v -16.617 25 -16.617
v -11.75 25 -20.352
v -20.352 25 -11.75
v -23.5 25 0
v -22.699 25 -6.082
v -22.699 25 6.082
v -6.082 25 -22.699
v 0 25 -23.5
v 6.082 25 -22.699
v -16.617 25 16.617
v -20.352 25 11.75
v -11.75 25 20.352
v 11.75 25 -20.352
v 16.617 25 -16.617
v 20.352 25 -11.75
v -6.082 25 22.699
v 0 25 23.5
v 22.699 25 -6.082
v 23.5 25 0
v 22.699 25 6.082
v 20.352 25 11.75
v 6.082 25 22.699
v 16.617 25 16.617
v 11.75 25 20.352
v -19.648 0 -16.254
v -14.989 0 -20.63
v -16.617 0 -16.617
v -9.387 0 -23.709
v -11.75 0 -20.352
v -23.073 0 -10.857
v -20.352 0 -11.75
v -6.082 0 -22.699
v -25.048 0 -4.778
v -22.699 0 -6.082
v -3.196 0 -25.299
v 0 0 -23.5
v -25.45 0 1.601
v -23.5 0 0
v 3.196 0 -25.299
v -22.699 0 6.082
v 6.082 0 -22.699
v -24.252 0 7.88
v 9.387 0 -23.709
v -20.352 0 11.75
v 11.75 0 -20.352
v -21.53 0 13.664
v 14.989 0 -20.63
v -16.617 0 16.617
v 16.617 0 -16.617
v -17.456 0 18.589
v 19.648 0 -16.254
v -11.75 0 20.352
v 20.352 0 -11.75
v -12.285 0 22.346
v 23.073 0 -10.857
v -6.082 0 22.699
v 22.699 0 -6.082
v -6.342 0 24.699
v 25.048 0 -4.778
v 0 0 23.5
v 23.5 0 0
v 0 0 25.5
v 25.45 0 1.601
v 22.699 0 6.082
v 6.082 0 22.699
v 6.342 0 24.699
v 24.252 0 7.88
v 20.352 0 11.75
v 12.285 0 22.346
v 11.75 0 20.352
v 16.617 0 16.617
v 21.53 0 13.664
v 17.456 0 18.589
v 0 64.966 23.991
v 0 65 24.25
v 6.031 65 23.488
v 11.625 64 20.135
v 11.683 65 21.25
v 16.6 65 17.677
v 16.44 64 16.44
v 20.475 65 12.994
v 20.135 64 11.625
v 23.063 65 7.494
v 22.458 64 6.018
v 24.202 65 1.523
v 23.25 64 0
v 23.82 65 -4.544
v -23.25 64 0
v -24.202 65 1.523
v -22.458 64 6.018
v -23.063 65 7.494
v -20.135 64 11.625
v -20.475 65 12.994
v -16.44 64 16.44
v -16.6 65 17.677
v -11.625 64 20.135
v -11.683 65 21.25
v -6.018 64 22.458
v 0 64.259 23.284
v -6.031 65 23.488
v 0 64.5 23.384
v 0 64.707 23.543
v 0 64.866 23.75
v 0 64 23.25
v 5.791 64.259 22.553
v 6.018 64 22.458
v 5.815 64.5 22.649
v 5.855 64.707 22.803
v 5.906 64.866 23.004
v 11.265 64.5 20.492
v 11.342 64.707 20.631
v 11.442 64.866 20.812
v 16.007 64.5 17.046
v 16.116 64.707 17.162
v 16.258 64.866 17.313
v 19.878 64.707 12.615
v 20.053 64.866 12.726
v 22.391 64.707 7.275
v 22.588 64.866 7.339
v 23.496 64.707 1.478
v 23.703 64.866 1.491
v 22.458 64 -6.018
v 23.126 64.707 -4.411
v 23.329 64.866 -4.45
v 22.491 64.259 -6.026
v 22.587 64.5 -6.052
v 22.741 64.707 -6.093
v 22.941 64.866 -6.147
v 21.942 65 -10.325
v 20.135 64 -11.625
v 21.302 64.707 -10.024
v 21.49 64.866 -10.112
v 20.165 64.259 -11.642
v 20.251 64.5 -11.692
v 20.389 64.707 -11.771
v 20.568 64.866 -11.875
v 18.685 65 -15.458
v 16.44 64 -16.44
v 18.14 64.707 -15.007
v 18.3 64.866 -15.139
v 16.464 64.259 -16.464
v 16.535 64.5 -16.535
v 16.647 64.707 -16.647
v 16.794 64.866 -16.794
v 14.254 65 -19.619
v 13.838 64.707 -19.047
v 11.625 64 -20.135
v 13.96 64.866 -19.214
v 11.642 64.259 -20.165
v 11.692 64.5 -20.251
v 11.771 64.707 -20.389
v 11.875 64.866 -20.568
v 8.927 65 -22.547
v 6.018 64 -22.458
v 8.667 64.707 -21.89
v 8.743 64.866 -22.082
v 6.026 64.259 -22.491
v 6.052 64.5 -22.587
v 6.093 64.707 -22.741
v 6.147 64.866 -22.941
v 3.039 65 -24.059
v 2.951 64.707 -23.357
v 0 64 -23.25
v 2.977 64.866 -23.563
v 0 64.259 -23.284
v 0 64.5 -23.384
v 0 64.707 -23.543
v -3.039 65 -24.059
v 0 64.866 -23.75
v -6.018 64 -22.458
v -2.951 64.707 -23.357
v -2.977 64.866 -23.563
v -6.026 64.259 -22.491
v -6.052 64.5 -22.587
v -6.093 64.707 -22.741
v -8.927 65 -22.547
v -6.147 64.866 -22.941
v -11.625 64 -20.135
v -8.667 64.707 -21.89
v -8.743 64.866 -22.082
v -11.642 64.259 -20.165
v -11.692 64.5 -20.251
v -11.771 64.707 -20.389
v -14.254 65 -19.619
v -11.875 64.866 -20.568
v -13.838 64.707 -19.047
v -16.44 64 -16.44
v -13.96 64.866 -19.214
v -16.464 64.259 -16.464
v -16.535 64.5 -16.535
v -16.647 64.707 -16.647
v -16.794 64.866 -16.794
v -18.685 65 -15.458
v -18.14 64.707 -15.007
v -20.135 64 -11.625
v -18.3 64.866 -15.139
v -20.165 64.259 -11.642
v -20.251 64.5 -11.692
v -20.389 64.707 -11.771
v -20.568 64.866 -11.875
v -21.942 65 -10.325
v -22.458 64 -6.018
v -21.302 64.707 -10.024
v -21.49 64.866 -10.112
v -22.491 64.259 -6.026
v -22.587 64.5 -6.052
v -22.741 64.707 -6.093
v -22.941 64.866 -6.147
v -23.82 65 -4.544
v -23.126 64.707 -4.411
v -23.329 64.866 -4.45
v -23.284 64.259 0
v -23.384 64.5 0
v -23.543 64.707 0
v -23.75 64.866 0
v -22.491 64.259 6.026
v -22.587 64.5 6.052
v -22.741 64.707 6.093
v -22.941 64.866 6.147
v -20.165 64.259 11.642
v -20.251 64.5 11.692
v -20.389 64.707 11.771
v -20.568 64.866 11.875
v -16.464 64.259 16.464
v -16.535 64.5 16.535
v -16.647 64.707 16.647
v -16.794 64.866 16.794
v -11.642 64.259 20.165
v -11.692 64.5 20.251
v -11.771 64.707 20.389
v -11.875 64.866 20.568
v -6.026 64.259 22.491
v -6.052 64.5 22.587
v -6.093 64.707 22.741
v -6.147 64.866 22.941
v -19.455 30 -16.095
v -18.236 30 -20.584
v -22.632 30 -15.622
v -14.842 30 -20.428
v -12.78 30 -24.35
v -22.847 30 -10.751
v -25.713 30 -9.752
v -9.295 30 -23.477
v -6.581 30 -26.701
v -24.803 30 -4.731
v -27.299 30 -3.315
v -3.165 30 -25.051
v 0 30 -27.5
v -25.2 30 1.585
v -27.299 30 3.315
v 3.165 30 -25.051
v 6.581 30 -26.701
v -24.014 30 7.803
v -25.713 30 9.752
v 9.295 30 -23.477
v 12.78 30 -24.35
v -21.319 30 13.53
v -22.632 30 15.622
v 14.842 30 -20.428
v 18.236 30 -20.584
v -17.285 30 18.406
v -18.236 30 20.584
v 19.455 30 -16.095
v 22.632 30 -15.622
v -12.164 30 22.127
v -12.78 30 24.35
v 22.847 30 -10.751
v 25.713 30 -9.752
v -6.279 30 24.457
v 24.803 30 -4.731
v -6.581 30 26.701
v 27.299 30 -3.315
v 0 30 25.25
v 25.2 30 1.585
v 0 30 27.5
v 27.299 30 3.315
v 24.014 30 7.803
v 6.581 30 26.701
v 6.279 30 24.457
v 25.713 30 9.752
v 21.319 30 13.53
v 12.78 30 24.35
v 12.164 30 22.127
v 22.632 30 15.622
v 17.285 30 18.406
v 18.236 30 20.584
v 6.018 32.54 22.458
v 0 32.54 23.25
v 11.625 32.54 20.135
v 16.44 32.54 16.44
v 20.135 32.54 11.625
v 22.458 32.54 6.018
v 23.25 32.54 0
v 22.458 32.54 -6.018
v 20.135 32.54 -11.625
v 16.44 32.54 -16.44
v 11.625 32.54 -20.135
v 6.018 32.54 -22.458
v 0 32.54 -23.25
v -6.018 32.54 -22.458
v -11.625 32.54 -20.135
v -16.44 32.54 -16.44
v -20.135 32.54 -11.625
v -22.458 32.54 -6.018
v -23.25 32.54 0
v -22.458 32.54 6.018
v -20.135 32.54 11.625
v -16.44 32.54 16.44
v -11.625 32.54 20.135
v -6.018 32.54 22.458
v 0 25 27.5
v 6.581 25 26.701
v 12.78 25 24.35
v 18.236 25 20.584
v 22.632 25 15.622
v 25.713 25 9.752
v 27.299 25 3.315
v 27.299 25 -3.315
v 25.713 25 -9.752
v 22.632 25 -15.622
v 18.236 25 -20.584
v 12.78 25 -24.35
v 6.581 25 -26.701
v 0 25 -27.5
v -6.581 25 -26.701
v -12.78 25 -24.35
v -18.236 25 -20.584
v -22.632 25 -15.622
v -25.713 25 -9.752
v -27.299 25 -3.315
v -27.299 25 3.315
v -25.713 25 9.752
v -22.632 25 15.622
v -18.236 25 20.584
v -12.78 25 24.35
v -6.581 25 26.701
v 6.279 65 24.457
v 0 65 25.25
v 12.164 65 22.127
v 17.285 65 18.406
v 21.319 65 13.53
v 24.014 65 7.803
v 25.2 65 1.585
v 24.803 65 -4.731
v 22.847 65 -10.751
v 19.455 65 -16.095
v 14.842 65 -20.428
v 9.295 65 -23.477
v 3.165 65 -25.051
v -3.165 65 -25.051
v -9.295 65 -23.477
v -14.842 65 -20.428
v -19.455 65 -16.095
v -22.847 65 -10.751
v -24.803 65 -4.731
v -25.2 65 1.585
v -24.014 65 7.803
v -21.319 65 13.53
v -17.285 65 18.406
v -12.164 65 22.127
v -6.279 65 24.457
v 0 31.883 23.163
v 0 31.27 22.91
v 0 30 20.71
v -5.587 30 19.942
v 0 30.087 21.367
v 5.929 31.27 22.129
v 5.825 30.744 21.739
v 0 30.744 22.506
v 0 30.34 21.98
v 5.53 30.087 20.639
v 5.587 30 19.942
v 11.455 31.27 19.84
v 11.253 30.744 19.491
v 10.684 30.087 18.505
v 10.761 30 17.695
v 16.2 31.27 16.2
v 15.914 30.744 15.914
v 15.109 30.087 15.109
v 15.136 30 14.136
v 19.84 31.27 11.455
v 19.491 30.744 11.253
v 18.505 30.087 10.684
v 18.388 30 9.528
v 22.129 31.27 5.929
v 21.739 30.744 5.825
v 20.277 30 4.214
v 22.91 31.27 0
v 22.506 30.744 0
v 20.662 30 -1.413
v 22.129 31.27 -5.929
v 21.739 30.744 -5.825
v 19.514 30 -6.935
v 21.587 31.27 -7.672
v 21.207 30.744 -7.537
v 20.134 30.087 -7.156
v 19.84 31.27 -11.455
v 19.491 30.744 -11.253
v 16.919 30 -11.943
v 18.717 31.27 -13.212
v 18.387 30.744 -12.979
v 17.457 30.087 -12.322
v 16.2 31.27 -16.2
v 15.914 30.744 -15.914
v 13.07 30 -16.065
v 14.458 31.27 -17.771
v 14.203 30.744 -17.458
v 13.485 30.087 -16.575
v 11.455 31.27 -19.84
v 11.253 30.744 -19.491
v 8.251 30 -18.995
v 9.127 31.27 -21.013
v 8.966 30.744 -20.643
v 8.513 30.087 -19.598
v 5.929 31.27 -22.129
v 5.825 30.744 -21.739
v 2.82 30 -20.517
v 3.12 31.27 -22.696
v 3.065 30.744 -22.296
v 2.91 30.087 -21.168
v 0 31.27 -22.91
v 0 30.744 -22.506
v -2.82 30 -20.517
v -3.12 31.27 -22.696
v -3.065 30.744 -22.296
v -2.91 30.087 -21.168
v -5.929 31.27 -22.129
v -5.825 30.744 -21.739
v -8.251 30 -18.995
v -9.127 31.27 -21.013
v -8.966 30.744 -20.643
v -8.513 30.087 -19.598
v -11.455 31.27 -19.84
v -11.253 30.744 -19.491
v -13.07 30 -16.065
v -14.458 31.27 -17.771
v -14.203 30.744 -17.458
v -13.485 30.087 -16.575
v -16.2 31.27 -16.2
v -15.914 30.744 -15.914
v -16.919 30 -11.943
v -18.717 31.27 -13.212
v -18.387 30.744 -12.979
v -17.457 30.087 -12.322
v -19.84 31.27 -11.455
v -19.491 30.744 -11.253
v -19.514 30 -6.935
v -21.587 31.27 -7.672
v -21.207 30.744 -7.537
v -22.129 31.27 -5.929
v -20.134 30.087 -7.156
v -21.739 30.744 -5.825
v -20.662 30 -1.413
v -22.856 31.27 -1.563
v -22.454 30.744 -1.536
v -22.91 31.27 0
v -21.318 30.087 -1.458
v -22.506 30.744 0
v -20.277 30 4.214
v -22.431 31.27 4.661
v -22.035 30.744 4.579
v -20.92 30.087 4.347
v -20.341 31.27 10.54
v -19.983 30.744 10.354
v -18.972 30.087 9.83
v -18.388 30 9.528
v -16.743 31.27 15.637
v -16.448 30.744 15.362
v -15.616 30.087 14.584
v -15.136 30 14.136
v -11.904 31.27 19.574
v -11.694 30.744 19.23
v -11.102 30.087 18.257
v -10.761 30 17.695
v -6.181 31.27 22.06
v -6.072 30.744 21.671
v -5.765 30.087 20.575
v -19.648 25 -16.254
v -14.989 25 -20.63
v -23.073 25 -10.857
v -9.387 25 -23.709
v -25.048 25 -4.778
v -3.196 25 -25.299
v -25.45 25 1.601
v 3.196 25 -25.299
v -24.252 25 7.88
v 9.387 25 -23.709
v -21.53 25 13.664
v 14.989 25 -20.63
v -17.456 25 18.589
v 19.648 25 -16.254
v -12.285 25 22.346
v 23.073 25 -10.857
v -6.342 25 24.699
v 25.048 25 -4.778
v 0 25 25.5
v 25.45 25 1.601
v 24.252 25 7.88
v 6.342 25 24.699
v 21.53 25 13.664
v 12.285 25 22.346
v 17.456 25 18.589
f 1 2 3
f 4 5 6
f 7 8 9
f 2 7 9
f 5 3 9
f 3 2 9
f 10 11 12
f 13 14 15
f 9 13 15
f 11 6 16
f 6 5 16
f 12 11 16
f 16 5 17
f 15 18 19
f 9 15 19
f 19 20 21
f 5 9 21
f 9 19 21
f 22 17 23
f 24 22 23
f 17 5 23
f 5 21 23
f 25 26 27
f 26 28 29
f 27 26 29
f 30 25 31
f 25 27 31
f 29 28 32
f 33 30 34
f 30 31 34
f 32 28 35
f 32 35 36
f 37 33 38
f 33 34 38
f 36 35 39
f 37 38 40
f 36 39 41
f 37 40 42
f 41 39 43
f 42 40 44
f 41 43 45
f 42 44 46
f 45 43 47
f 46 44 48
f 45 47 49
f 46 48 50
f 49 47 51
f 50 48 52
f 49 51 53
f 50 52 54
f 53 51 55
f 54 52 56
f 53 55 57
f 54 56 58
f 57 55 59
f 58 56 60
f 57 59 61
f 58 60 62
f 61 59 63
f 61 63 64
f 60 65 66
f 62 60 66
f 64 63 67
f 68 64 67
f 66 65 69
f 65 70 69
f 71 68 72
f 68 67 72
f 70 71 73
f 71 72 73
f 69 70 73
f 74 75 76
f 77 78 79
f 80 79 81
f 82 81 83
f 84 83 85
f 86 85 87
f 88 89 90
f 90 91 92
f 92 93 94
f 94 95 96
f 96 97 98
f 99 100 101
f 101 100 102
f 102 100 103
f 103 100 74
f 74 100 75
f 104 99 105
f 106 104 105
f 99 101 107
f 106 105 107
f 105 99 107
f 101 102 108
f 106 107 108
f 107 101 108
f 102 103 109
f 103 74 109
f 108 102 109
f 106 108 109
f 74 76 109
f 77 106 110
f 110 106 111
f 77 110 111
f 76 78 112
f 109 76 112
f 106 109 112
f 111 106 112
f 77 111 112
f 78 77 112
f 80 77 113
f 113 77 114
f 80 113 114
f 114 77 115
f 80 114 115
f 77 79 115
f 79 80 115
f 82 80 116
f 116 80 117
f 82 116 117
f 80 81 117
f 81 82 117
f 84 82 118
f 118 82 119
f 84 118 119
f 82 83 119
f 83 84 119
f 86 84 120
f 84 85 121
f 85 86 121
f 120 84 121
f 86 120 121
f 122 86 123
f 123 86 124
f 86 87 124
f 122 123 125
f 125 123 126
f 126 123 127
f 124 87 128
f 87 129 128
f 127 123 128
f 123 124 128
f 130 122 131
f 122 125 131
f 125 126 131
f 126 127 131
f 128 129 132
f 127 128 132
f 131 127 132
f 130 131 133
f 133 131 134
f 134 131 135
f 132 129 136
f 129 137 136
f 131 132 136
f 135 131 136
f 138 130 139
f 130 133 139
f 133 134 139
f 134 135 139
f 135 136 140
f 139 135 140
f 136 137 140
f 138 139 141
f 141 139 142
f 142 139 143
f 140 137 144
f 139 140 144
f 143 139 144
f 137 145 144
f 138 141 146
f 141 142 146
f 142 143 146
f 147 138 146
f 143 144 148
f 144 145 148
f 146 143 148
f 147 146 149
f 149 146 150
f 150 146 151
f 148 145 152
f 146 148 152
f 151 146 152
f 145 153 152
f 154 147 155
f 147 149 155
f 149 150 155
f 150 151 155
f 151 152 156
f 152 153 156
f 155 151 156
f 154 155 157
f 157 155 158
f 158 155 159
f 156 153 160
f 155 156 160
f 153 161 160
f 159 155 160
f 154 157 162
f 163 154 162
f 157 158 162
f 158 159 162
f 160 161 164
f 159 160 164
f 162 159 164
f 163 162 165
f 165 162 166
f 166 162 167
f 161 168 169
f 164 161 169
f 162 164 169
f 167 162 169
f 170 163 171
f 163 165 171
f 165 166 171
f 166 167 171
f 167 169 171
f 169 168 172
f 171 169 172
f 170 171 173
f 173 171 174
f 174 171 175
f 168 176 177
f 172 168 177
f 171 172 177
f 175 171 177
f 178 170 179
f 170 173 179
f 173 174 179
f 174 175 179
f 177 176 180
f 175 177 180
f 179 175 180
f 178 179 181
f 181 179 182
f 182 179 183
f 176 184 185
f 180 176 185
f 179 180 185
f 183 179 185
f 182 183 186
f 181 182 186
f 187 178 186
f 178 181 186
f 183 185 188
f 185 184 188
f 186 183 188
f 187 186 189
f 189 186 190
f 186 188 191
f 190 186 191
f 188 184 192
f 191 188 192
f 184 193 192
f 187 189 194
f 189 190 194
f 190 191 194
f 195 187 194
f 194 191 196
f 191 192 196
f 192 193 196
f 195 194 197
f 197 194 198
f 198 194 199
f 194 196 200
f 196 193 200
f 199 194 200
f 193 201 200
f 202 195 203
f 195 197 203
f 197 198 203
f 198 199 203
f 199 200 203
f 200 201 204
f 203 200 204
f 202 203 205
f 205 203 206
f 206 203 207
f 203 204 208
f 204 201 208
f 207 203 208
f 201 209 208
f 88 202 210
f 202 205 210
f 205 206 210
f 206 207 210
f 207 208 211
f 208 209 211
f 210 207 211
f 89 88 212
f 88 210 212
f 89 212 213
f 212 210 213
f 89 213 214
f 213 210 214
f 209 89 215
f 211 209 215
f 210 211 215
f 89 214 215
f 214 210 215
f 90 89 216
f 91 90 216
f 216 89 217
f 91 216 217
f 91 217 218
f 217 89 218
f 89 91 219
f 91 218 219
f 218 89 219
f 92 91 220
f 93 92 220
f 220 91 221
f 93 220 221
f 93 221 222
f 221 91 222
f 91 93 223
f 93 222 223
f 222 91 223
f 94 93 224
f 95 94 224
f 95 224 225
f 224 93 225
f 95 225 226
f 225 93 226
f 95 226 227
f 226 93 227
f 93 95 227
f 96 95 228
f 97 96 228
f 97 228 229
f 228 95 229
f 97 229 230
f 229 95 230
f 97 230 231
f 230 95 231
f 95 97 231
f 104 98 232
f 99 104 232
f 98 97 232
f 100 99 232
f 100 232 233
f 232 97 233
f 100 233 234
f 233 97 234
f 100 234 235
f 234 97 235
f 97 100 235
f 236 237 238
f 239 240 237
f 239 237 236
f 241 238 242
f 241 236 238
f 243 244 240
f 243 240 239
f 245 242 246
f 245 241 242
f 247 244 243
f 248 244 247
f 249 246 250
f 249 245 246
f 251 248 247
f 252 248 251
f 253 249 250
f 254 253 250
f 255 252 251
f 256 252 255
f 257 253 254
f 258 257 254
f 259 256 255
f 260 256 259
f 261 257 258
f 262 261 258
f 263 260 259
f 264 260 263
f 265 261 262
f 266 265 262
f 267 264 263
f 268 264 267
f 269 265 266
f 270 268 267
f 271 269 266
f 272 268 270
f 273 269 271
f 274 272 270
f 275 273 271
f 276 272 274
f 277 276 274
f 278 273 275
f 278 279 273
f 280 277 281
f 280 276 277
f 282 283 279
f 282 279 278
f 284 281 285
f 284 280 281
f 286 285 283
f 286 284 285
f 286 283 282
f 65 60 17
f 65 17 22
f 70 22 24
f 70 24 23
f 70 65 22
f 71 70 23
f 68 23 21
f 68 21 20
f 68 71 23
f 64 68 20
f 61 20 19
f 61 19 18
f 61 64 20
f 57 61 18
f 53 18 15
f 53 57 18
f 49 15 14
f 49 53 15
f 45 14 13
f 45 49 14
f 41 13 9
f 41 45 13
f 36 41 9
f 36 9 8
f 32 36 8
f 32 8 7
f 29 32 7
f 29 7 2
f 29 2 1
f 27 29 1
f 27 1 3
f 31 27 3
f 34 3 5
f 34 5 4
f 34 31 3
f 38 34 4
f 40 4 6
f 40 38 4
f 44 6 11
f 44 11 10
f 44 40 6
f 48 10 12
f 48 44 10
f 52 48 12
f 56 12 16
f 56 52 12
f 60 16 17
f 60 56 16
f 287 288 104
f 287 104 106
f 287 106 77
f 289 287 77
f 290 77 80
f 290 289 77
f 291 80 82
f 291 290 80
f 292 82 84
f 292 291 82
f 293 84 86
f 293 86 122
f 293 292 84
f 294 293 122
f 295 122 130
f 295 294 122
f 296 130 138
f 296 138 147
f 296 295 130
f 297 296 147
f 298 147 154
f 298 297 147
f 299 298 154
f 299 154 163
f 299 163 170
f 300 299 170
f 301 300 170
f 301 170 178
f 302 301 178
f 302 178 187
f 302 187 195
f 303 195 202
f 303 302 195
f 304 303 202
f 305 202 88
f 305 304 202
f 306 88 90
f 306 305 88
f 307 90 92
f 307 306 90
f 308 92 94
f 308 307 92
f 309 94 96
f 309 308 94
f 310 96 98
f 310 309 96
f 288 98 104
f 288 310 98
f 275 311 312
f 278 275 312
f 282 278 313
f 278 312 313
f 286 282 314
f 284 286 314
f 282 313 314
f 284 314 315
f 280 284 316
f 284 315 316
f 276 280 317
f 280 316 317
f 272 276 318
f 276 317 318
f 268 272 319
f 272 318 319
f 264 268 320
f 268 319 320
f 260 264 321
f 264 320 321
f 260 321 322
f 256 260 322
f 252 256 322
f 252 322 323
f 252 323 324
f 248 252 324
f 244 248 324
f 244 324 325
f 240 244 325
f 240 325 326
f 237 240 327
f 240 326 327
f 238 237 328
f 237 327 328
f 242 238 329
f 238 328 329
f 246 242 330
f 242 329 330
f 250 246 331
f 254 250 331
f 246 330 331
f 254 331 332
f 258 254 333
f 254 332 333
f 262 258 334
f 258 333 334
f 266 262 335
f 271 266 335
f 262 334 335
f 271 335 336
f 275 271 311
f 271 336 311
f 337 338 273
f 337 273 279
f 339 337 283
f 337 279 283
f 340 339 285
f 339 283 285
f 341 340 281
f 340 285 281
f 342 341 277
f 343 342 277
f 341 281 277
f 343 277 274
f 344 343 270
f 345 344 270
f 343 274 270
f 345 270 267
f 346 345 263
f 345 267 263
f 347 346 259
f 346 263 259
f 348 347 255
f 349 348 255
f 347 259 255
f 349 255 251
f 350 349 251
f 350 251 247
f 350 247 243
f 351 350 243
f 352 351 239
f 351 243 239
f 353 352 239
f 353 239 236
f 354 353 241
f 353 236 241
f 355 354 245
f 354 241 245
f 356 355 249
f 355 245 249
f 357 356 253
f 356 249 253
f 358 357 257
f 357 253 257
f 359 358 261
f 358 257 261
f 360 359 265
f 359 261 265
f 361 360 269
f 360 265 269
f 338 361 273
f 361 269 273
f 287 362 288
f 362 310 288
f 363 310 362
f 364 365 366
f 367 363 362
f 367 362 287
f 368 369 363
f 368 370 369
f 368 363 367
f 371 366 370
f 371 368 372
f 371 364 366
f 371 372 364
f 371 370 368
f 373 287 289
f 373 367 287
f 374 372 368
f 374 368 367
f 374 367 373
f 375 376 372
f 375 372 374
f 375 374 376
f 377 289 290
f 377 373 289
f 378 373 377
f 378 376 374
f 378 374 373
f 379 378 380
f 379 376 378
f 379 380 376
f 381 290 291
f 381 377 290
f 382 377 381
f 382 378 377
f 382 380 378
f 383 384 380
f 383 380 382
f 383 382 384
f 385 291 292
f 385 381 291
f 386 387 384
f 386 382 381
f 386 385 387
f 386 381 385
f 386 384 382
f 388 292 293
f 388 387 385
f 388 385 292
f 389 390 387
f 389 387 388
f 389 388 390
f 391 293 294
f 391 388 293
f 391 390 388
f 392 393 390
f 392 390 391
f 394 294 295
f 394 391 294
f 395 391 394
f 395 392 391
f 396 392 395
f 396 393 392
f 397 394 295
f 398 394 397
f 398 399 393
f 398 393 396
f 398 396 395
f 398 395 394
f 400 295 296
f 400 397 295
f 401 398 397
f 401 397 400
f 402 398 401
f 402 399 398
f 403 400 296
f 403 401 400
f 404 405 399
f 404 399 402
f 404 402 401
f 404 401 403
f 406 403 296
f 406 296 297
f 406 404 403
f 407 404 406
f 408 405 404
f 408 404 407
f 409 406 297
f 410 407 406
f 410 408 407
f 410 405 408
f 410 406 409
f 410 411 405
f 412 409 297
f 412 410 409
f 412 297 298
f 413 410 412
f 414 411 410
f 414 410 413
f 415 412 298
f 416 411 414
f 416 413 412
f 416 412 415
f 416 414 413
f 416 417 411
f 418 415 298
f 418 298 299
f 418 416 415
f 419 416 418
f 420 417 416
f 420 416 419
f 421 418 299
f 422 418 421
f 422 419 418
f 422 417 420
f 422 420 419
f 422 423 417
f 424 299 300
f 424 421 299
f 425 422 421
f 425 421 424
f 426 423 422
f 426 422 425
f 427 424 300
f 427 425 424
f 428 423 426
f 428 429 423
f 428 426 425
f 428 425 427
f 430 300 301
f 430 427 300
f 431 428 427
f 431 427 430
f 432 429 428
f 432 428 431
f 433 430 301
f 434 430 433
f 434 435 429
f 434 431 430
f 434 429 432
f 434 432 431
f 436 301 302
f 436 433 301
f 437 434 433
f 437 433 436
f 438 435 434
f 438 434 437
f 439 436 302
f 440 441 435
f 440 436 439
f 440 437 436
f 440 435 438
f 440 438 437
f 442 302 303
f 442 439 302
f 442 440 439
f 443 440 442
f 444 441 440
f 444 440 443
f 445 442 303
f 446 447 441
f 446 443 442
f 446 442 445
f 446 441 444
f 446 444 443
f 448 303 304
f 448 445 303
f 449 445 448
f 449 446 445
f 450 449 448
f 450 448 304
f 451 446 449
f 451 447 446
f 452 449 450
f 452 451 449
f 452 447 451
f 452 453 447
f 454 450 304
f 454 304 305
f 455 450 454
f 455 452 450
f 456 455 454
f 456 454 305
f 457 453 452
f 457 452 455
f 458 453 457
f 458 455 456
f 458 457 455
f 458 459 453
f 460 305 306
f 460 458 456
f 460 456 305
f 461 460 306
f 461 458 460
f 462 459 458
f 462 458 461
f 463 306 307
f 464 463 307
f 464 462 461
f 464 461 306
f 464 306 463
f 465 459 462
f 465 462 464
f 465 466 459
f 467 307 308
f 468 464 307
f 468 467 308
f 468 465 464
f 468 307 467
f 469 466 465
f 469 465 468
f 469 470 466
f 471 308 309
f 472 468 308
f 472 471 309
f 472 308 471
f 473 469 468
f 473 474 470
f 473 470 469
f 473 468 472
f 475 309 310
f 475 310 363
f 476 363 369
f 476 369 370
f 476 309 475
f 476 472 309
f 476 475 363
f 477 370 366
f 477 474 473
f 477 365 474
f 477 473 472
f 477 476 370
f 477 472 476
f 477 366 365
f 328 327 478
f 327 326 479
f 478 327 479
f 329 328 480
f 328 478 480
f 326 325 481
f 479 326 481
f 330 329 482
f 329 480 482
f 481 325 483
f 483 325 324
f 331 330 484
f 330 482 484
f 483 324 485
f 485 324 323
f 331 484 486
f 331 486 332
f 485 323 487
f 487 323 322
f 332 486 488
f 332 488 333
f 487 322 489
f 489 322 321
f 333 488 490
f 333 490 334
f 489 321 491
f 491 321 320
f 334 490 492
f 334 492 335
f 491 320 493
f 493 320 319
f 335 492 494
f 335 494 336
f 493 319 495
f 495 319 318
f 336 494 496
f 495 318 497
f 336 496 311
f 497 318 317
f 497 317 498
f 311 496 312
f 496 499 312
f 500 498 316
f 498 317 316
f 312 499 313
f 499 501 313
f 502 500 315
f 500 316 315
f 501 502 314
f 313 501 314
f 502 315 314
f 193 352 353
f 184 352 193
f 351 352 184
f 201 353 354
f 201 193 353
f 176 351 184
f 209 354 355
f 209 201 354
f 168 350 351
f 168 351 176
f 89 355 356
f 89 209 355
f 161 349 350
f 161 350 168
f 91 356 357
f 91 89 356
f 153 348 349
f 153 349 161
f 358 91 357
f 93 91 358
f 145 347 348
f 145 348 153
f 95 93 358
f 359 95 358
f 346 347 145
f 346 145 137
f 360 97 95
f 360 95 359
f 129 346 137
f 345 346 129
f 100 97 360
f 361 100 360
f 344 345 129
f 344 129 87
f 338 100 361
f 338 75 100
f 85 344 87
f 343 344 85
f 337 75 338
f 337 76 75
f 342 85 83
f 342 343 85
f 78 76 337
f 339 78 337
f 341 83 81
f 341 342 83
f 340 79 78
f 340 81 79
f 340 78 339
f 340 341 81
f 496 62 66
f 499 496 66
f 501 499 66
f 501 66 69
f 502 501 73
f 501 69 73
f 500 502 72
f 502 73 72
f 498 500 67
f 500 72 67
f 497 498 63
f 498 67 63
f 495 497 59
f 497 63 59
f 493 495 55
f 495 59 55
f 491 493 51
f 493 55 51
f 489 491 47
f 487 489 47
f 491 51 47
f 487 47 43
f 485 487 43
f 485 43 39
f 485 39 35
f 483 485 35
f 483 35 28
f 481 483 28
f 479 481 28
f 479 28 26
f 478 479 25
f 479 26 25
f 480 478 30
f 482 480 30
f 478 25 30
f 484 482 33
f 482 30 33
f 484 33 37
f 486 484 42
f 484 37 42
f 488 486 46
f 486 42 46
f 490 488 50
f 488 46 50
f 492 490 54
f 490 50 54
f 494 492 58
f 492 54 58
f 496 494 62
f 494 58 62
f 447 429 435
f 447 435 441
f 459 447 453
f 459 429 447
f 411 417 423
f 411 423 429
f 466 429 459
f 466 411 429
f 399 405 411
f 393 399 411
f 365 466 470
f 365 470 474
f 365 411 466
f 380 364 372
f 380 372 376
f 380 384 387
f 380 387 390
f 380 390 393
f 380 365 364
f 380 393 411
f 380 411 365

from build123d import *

# Parameters (mm, degrees)
SKETCH1_R           = 25.5
SKETCH1_R_2         = 23.5
BOSS_EXTRUDE1_DEPTH = 25
SKETCH2_R           = 27.5
BOSS_EXTRUDE2_DEPTH = 5
SKETCH3_R           = 25.25
SKETCH3_R_2         = 23.25
BOSS_EXTRUDE3_DEPTH = 35
FILLET1_R           = 2.54
FILLET2_R           = 1


with BuildPart() as part:
    # Sketch1 → Boss-Extrude1 (new body)
    with BuildSketch(Plane(origin=(0, 0, 0), x_dir=(1, 0, 0), z_dir=(0, 1, 0))):
        with Locations(Location((0, 0, 0), (0, 0, 270))):
            Circle(SKETCH1_R)
        with Locations(Location((0, 0, 0), (0, 0, 270))):
            Circle(SKETCH1_R_2, mode=Mode.SUBTRACT)
    extrude(amount=BOSS_EXTRUDE1_DEPTH)

    # Sketch2 → Boss-Extrude2 (add)
    with BuildSketch(Plane(origin=(0, 25, 0), x_dir=(1, 0, 0), z_dir=(0, 1, 0))):
        with Locations(Location((0, 0, 0), (0, 0, 270))):
            Circle(SKETCH2_R)
    extrude(amount=BOSS_EXTRUDE2_DEPTH)

    # Sketch3 → Boss-Extrude3 (add)
    with BuildSketch(Plane(origin=(0, 30, 0), x_dir=(1, 0, 0), z_dir=(0, 1, 0))):
        with Locations(Location((0, 0, 0), (0, 0, 270))):
            Circle(SKETCH3_R)
        with Locations(Location((0, 0, 0), (0, 0, 270))):
            Circle(SKETCH3_R_2, mode=Mode.SUBTRACT)
    extrude(amount=BOSS_EXTRUDE3_DEPTH)

    # Fillet1
    fillet1_edges = [part.edges().sort_by_distance(p)[0] for p in [
        (0, 30, -23.25),
    ]]
    fillet(fillet1_edges, radius=FILLET1_R)

    # Fillet2
    fillet2_edges = [part.edges().sort_by_distance(p)[0] for p in [
        (0, 65, -23.25),
    ]]
    fillet(fillet2_edges, radius=FILLET2_R)


solid = part.part
